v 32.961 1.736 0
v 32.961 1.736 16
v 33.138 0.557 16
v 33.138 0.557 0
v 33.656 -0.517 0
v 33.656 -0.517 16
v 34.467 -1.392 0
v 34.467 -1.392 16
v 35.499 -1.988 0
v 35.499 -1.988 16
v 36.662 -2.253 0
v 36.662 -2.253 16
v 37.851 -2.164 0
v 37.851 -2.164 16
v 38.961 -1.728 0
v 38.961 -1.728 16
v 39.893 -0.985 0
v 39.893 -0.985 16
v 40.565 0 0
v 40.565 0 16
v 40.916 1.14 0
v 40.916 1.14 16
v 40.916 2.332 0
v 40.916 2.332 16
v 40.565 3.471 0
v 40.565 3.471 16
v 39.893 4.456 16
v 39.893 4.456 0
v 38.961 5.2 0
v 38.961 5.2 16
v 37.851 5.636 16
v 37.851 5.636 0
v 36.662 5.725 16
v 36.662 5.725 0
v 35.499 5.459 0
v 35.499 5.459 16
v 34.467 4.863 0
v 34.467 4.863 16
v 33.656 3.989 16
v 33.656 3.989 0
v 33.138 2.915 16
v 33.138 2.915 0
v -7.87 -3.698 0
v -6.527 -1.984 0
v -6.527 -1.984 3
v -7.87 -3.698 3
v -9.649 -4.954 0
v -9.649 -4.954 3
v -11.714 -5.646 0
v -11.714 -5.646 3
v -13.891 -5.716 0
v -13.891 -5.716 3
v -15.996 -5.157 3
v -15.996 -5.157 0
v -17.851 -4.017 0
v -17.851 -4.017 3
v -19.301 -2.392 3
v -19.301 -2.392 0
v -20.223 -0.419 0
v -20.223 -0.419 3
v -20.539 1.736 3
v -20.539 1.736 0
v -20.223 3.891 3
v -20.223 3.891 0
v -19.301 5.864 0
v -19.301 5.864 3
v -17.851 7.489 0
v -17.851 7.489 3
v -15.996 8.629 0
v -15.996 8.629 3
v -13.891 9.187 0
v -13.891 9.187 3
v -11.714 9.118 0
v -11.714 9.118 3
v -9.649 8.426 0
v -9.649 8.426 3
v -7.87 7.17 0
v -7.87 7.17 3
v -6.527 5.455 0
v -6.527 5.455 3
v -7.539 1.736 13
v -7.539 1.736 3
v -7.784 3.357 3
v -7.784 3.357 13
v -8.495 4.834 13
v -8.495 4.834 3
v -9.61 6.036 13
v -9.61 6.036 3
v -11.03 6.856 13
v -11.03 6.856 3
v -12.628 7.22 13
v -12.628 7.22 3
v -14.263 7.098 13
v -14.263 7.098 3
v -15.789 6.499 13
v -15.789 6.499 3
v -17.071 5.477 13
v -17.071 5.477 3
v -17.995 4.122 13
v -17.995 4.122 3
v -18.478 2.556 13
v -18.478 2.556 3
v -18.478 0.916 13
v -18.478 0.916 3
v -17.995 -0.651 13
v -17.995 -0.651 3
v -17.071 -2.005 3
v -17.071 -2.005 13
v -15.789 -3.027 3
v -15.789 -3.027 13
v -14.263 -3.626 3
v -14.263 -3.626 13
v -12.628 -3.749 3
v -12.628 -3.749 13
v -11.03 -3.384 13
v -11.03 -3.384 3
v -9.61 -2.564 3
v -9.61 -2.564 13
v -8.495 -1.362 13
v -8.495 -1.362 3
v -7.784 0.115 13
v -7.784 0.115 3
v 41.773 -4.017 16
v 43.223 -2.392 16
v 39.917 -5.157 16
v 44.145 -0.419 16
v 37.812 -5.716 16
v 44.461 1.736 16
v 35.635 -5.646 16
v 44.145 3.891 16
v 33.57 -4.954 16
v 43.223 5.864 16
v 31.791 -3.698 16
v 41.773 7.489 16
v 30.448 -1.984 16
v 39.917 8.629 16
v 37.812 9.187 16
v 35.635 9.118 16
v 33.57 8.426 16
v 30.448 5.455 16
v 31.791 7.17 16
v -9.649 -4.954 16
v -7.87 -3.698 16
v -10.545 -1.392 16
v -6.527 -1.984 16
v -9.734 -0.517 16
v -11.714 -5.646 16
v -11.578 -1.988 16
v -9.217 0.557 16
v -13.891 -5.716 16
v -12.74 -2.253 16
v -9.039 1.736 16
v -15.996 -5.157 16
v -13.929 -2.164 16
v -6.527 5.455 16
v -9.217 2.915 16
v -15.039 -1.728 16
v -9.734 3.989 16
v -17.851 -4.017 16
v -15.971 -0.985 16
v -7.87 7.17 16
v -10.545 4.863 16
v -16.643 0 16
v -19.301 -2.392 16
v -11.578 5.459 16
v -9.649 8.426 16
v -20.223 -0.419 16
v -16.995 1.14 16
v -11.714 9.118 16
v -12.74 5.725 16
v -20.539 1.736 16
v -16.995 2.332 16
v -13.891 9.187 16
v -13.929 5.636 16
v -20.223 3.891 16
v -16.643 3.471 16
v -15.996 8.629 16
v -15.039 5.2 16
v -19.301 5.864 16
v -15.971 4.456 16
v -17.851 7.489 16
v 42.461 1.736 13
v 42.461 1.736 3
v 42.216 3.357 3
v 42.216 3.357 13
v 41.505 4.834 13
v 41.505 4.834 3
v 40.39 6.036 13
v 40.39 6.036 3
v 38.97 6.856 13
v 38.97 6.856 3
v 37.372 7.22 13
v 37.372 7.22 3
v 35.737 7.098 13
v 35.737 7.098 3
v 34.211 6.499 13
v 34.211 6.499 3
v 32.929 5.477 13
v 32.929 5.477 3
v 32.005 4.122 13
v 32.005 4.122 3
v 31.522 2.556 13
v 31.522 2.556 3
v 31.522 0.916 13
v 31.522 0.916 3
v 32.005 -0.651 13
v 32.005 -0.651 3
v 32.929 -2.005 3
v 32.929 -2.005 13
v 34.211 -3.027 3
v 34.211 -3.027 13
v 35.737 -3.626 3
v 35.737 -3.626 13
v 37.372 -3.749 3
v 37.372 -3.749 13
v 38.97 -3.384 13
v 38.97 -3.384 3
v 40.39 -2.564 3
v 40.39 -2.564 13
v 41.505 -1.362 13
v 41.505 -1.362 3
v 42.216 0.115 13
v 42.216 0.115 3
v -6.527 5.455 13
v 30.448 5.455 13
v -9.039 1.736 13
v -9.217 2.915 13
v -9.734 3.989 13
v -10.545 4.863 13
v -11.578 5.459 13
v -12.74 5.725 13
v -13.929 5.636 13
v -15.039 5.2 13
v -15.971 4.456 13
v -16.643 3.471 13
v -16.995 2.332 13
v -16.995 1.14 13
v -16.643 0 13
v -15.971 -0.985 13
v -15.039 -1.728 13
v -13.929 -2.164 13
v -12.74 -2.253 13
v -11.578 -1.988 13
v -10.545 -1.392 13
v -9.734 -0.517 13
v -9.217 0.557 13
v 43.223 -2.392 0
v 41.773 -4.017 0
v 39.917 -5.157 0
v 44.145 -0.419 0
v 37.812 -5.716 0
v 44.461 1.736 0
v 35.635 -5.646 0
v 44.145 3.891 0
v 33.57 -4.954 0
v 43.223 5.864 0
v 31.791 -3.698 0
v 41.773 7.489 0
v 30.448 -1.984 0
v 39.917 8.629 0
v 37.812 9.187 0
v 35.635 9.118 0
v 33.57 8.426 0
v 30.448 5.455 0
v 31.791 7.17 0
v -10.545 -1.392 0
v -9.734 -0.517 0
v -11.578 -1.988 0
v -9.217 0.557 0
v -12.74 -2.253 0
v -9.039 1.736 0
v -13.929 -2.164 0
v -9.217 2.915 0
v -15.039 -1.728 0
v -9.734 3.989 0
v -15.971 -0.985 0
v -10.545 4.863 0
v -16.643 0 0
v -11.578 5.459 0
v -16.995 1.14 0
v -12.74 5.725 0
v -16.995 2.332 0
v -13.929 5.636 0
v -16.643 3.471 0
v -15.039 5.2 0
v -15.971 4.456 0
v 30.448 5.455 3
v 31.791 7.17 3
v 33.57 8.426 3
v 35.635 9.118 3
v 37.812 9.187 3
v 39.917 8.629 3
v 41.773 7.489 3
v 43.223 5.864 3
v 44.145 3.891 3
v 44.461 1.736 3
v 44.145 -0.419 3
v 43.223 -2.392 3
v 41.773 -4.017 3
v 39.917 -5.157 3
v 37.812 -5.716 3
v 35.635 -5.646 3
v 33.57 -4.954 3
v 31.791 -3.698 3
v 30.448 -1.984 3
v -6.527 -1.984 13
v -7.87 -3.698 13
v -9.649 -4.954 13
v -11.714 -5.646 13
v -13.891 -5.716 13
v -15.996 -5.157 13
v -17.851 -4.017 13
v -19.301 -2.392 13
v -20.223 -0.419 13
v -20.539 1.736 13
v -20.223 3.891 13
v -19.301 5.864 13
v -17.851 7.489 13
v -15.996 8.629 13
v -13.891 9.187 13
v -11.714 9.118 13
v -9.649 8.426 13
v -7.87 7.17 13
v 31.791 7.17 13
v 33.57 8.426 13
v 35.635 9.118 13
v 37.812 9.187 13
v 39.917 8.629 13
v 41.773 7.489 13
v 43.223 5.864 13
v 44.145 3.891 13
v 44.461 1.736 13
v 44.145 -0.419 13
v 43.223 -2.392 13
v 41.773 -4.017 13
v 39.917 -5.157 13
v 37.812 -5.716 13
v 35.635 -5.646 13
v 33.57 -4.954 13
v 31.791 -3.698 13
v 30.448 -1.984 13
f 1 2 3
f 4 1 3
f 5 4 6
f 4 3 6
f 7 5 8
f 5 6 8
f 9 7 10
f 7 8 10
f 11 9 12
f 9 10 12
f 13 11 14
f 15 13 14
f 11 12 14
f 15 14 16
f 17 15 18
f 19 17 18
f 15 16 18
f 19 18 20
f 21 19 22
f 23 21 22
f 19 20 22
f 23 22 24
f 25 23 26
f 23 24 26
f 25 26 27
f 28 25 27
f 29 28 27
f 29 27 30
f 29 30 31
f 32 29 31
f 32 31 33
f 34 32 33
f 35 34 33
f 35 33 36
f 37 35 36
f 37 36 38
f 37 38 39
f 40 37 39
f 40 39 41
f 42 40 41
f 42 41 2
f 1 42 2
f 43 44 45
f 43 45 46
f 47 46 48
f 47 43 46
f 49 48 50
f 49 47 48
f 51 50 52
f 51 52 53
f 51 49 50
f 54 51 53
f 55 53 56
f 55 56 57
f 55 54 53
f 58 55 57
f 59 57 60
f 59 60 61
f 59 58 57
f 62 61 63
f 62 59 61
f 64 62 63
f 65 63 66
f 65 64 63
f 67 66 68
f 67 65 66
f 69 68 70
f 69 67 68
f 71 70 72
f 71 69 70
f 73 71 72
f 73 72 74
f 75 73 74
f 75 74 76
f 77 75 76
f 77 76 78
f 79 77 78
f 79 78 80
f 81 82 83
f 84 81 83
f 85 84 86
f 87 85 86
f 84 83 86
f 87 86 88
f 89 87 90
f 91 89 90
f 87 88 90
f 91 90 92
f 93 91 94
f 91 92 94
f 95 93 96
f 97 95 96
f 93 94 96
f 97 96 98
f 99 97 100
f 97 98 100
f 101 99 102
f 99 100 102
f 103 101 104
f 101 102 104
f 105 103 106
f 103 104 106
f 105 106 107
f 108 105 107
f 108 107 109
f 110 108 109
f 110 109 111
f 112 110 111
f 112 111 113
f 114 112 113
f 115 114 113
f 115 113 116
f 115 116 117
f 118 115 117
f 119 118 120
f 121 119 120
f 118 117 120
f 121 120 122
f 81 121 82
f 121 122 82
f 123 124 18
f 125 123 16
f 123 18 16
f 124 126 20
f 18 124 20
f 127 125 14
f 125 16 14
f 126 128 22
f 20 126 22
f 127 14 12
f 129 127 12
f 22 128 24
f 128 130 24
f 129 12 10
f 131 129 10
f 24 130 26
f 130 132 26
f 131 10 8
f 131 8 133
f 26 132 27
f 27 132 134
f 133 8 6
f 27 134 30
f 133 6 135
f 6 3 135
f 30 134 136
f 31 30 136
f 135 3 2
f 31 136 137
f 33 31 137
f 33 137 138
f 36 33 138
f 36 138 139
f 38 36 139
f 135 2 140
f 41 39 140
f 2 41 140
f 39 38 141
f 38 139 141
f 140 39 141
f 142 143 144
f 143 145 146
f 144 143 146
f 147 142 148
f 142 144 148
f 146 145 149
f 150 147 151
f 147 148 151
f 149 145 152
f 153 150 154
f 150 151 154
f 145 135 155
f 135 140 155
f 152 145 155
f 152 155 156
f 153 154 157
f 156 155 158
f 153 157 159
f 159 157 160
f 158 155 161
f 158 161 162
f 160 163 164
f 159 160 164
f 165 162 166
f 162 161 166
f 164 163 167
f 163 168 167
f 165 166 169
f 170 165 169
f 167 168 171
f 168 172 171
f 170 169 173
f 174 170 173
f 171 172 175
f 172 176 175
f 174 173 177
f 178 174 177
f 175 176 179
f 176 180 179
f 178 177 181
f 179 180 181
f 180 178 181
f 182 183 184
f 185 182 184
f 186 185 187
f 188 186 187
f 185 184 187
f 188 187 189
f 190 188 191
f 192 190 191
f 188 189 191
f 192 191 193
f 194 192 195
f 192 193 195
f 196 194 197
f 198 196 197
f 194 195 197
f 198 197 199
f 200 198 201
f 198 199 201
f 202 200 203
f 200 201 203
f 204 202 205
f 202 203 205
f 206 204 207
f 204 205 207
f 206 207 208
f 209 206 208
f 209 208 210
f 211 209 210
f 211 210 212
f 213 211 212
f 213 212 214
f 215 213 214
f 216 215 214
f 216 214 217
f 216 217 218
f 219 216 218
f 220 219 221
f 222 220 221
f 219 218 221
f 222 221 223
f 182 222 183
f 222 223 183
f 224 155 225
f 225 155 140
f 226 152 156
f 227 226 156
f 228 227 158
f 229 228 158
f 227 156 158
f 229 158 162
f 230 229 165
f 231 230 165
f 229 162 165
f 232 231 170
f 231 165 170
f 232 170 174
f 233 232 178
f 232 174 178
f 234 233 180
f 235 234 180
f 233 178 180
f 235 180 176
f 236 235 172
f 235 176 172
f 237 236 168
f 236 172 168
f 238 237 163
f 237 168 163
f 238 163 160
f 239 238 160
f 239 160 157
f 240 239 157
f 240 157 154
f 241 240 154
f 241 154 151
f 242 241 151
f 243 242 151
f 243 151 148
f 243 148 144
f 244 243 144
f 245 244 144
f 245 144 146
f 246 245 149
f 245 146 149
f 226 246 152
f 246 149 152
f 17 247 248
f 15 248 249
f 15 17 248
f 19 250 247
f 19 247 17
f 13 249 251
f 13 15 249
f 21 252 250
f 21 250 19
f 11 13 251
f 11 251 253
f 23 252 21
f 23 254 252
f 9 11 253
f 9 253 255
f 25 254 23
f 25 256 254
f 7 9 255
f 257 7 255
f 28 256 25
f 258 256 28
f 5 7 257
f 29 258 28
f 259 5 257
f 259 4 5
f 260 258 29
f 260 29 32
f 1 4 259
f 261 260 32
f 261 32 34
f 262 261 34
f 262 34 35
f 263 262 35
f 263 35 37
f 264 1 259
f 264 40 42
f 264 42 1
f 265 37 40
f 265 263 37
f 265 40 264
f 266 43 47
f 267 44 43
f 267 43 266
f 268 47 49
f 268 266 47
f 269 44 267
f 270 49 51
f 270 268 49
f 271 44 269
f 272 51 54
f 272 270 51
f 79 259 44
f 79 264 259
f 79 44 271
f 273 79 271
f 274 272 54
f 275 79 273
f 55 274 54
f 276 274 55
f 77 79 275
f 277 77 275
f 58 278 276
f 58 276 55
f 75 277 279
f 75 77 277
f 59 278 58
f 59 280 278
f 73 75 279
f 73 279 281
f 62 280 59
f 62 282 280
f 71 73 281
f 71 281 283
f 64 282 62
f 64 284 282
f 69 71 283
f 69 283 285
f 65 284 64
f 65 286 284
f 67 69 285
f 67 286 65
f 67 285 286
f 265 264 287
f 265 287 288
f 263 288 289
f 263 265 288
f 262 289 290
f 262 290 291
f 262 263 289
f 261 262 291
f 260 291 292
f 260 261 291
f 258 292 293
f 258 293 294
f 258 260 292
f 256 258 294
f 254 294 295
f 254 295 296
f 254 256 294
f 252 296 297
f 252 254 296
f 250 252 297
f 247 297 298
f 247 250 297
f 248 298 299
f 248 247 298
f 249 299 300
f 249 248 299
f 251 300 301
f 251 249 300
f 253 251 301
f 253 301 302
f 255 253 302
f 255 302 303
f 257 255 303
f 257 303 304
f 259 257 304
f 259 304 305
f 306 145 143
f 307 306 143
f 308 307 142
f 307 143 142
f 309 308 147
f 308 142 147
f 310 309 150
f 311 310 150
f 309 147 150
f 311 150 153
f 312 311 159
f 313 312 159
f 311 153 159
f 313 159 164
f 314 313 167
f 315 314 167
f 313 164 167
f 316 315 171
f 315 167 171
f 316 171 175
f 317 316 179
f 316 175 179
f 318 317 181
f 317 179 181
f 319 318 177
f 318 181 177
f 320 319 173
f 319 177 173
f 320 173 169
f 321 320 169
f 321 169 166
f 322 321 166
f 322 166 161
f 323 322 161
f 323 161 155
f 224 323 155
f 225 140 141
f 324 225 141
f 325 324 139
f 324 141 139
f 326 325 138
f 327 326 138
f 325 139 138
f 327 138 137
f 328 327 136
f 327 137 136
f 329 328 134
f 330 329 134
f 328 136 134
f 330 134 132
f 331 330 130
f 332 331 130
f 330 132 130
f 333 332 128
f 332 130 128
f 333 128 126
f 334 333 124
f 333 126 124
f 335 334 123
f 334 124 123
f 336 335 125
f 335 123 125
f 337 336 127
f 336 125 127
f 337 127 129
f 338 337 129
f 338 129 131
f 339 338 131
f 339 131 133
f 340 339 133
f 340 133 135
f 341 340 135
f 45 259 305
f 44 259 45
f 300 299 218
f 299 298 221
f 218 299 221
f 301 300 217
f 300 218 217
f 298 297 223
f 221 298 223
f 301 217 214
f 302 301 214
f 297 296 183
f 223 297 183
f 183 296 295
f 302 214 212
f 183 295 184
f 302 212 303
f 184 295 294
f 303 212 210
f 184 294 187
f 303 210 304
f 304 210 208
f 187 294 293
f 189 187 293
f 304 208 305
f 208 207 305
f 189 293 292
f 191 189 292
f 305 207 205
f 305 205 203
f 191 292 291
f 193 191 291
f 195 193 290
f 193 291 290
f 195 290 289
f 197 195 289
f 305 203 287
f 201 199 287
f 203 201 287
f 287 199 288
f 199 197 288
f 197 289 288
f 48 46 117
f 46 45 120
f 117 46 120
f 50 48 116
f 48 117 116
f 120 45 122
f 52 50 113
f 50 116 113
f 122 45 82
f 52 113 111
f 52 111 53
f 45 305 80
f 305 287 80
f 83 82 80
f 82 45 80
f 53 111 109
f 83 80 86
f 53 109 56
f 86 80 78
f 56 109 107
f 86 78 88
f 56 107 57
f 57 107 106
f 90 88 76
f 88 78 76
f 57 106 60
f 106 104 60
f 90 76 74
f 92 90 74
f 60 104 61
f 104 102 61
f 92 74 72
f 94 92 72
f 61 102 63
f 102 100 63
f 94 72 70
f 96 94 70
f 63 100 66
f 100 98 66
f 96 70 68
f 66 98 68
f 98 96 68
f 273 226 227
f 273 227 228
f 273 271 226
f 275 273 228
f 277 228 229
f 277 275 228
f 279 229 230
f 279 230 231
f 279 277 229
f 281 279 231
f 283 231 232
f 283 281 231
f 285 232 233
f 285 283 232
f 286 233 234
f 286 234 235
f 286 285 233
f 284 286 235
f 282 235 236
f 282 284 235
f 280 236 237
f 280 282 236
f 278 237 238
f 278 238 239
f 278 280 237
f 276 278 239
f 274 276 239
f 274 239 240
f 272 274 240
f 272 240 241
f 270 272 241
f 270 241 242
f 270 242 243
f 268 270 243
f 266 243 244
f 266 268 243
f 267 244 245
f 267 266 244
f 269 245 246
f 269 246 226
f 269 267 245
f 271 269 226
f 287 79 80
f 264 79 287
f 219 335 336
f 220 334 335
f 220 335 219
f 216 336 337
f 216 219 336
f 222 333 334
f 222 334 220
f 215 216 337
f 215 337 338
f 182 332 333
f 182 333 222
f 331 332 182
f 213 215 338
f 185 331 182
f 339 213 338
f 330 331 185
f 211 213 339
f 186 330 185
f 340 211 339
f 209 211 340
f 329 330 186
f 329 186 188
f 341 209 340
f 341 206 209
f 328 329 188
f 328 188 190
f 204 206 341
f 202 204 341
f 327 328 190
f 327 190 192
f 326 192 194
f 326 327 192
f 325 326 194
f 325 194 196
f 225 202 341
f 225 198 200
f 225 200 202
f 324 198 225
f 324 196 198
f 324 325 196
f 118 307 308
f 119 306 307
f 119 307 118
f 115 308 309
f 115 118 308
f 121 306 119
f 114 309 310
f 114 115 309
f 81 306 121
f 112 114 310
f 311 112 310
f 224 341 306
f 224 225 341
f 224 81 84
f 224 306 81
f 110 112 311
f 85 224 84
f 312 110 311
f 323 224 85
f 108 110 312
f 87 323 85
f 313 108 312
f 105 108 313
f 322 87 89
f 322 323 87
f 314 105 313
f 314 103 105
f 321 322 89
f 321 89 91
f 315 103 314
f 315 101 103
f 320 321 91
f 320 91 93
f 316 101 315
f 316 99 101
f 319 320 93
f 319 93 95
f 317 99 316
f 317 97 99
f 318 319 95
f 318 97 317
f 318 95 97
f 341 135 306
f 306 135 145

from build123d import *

# Parameters (mm, degrees)
SKETCH_1_R      = 4
EXTRUDE_1_DEPTH = 3
SKETCH_2_R      = 5.5
SKETCH_2_R_2    = 4
EXTRUDE_2_DEPTH = 10


with BuildPart() as part:
    # 草图1 → 凸台-拉伸1 (new body)
    with BuildSketch(Plane.XY):
        with BuildLine():
            Line((-6.52657961, 5.455372618), (30.448093928, 5.455372618))
            ThreePointArc((30.448093928, 5.455372618), (44.460757159, 1.735800378), (30.448093928, -1.983771861))
            Line((30.448093928, -1.983771861), (-6.52657961, -1.983771861))
            ThreePointArc((-6.52657961, -1.983771861), (-20.539242841, 1.735800378), (-6.52657961, 5.455372618))
        make_face()
        with Locations((-13.039242841, 1.735800378)):
            Circle(SKETCH_1_R, mode=Mode.SUBTRACT)
        with Locations(Location((36.960757159, 1.735800378, 0), (0, 0, 180))):
            Circle(SKETCH_1_R, mode=Mode.SUBTRACT)
    extrude_1 = extrude(amount=EXTRUDE_1_DEPTH)

    # 草图2 → 凸台-拉伸2 (add)
    # profile 1 of 2: a face of its own
    with BuildSketch(Plane.XY.offset(3)):
        with Locations((-13.039242841, 1.735800378)):
            Circle(SKETCH_2_R)
        with Locations((-13.039242841, 1.735800378)):
            Circle(SKETCH_2_R_2, mode=Mode.SUBTRACT)
    # profile 2 of 2: a face of its own
    with BuildSketch(Plane.XY.offset(3)):
        with Locations((36.960757159, 1.735800378)):
            Circle(SKETCH_2_R)
        with Locations(Location((36.960757159, 1.735800378, 0), (0, 0, 180))):
            Circle(SKETCH_2_R_2, mode=Mode.SUBTRACT)
    extrude(amount=EXTRUDE_2_DEPTH)

    # 镜向1: 凸台-拉伸1 across plane
    add(extrude_1.mirror(Plane.XY.offset(8)))


solid = part.part
